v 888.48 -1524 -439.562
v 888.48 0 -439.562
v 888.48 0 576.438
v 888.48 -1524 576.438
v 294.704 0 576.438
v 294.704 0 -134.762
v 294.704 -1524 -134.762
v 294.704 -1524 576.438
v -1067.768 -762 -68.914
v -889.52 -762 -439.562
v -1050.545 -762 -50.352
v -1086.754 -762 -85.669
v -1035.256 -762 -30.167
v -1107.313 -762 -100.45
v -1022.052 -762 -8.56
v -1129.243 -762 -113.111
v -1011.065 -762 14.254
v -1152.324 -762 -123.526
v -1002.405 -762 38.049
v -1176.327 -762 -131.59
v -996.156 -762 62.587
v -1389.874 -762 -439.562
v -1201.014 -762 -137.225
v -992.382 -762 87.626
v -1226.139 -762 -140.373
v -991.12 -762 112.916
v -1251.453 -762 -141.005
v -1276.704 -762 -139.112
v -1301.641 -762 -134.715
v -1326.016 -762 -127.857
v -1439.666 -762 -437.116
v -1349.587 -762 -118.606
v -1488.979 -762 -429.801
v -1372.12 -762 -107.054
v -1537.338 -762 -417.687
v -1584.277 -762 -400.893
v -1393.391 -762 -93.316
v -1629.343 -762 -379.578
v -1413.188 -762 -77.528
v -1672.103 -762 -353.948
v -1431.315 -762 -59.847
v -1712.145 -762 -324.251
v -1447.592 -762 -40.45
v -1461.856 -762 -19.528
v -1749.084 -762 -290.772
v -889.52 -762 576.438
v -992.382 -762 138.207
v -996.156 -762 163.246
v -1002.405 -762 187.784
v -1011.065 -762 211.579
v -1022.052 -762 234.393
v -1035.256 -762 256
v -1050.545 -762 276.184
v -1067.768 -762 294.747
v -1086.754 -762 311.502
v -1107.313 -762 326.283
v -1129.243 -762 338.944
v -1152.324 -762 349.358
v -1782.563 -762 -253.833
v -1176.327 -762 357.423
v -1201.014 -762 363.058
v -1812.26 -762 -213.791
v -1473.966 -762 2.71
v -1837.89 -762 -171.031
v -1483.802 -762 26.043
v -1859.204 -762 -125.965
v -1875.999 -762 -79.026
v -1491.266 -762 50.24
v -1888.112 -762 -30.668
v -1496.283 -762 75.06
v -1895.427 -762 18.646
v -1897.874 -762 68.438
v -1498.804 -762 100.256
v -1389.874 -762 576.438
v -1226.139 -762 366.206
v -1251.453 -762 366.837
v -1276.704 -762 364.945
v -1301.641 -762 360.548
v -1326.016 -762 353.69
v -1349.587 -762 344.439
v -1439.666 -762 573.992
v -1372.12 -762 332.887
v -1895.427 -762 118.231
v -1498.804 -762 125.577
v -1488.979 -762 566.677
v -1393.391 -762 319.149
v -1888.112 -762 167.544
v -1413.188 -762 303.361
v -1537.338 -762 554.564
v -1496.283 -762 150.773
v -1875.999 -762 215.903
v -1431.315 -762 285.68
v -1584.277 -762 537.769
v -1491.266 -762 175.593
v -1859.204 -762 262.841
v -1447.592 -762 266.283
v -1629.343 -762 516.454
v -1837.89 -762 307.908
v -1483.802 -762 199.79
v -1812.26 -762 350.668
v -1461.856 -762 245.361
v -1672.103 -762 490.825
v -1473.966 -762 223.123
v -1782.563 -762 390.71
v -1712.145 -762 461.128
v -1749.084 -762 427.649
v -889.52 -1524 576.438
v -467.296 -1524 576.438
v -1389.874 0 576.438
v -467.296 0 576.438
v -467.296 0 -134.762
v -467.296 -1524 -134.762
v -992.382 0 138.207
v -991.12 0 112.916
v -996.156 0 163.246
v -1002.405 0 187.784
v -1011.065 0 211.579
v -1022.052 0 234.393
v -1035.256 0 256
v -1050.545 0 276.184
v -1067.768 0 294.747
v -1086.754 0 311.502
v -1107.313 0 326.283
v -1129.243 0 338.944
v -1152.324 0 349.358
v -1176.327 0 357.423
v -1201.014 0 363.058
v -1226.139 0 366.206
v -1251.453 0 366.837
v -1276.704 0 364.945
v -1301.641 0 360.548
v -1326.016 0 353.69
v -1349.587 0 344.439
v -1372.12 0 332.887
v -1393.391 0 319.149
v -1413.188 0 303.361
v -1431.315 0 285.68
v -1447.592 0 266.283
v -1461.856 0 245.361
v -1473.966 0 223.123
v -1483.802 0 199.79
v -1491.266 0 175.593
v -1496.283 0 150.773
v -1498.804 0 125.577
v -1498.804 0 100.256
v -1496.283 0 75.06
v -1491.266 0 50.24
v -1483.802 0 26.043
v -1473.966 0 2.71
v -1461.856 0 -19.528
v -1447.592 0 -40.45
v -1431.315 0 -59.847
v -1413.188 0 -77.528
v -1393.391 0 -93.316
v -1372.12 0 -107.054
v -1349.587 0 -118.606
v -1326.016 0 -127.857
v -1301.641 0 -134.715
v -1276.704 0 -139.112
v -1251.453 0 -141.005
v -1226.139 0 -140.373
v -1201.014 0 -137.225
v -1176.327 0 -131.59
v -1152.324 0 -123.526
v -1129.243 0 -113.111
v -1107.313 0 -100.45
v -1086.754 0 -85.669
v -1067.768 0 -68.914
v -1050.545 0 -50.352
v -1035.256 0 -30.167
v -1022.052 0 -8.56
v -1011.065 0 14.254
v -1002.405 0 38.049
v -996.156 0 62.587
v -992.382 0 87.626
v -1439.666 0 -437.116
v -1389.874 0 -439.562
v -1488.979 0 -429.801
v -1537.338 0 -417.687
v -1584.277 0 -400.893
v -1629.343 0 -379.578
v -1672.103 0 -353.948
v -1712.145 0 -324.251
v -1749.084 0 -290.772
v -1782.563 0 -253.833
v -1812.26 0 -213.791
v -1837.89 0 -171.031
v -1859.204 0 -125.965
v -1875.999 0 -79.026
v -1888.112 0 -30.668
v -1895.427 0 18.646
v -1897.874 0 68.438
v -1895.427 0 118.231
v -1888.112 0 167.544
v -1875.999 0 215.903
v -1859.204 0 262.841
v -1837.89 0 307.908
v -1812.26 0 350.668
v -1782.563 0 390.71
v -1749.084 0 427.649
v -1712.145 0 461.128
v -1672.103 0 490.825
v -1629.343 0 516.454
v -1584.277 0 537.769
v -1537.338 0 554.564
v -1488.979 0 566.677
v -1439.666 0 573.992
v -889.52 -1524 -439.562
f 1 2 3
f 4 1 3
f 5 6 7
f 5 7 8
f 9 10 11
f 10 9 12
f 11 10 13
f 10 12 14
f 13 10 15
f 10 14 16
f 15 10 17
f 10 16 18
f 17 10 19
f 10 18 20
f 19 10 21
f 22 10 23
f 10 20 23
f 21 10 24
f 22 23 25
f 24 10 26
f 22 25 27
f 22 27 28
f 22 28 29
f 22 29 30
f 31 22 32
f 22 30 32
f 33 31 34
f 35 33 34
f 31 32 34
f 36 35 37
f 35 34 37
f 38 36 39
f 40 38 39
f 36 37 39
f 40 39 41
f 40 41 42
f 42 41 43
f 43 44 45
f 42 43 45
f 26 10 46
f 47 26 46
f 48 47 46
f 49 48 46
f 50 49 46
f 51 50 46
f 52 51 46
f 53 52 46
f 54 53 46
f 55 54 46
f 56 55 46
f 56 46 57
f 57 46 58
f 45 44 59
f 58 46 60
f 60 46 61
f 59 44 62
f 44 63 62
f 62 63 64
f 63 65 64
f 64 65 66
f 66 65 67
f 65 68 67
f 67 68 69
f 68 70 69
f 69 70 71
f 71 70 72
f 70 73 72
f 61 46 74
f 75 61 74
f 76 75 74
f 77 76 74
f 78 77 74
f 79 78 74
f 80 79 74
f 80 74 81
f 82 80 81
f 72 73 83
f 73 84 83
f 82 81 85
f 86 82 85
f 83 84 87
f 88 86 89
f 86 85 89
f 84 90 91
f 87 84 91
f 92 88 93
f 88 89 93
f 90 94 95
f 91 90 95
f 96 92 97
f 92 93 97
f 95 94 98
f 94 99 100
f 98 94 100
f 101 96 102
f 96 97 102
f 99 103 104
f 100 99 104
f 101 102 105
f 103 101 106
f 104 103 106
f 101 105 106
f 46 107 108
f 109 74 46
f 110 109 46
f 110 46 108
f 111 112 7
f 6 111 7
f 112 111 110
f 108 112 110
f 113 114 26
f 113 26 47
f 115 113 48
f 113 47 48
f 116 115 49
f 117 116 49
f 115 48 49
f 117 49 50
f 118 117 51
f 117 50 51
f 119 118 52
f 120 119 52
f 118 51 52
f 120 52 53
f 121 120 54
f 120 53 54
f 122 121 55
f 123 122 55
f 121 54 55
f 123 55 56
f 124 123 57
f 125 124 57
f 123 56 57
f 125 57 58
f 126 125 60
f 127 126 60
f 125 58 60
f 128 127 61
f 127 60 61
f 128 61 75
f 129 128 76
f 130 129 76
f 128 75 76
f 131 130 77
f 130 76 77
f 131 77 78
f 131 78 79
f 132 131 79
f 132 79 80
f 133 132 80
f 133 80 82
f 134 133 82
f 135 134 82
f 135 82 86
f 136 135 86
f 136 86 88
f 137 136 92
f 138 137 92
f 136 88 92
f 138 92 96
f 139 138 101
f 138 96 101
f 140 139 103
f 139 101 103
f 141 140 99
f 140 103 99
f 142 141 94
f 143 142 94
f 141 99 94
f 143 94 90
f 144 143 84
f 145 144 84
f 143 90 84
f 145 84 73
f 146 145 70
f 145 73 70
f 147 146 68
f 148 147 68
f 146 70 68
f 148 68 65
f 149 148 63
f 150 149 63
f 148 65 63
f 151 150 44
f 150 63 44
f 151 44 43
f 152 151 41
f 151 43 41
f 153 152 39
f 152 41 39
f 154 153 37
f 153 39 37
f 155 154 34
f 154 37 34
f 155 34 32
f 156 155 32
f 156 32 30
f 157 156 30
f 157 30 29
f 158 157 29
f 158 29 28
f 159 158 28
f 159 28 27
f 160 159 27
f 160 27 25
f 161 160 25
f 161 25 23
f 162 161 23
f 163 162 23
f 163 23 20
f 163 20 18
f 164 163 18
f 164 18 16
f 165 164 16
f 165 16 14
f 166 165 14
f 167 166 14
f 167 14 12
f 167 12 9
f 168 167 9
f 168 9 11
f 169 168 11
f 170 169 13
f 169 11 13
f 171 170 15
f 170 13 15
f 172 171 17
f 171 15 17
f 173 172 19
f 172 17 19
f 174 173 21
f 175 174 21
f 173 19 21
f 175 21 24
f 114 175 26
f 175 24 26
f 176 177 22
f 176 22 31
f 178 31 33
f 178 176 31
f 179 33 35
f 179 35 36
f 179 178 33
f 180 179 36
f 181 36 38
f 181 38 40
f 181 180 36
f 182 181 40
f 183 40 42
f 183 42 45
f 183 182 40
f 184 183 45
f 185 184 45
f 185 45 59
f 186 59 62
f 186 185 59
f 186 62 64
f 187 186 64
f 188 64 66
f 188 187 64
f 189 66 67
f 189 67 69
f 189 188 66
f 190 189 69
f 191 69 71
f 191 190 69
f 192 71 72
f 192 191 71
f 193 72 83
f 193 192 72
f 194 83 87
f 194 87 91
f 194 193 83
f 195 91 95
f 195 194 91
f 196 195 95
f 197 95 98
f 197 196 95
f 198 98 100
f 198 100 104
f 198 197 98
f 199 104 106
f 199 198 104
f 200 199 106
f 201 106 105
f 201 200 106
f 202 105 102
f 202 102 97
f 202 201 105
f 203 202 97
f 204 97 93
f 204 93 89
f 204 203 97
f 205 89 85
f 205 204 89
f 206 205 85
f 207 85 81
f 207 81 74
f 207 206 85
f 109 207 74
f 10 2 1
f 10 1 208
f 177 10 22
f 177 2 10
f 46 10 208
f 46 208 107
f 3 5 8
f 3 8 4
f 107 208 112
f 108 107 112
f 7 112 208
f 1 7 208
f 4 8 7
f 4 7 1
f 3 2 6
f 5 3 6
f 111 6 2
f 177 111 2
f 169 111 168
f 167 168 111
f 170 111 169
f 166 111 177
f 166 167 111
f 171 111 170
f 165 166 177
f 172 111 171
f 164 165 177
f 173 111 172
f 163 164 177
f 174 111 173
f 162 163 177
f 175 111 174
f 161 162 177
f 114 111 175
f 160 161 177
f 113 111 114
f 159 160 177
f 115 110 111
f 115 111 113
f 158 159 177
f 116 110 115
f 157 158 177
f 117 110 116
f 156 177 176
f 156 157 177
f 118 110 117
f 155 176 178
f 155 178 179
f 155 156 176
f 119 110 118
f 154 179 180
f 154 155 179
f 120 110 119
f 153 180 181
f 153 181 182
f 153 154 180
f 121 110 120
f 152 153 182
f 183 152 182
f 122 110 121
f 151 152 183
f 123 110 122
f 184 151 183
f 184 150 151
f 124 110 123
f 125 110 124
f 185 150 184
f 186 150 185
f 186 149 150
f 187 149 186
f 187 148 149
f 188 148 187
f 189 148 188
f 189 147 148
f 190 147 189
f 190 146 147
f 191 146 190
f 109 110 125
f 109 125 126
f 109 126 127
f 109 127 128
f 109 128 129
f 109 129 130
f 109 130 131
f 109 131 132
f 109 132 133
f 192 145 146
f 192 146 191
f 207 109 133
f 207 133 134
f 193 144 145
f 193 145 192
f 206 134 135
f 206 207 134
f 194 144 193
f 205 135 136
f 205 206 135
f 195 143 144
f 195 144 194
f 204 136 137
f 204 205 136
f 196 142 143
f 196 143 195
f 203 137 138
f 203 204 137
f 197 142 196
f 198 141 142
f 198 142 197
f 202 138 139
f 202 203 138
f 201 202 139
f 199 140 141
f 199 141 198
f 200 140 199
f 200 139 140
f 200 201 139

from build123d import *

# Parameters (mm, degrees)
F0_W     = 1778
F0_H     = 1016
F1_DEPTH = 1524
F2_W     = 762
F2_H     = 711.2
F3_DEPTH = 1524
F5_DEPTH = 762
F6_R     = 254
F7_DEPTH = 762


with BuildPart() as f1:
    # F0 (on Front) → F1 (new body)
    with BuildSketch(Plane.XZ):
        with Locations((-0.520221889, 68.4382907511)):
            Rectangle(F0_W, F0_H)
    extrude(amount=F1_DEPTH)

    # F2 (on face) → F3 (cut)
    with BuildSketch(Plane.XZ.offset(1524)):
        with Locations((-86.2960639, 220.8382907511)):
            Rectangle(F2_W, F2_H)
    extrude(amount=-F3_DEPTH, mode=Mode.SUBTRACT)

    # F4 (on face) → F5 (join)
    with BuildSketch(Plane(origin=(0, 0, 0), x_dir=(-1, 0, 0), z_dir=(0, 1, 0))):
        with BuildLine():
            Line((1389.8735046387, 576.4382907511), (889.520221889, 576.4382907511))
            Line((889.520221889, 576.4382907511), (889.520221889, -439.5617092489))
            Line((889.520221889, -439.5617092489), (1389.8735046387, -439.5617092489))
            ThreePointArc((1389.8735046387, -439.5617092489), (1897.8735046387, 68.4382907511), (1389.8735046387, 576.4382907511))
        make_face()
    extrude(amount=-F5_DEPTH)

    # F6 (on face) → F7 (cut)
    with BuildSketch(Plane.XZ.offset(762)):
        with Locations((-1245.120221889, 112.9164099693)):
            Circle(F6_R)
    extrude(amount=-F7_DEPTH, mode=Mode.SUBTRACT)


solid = f1.part
